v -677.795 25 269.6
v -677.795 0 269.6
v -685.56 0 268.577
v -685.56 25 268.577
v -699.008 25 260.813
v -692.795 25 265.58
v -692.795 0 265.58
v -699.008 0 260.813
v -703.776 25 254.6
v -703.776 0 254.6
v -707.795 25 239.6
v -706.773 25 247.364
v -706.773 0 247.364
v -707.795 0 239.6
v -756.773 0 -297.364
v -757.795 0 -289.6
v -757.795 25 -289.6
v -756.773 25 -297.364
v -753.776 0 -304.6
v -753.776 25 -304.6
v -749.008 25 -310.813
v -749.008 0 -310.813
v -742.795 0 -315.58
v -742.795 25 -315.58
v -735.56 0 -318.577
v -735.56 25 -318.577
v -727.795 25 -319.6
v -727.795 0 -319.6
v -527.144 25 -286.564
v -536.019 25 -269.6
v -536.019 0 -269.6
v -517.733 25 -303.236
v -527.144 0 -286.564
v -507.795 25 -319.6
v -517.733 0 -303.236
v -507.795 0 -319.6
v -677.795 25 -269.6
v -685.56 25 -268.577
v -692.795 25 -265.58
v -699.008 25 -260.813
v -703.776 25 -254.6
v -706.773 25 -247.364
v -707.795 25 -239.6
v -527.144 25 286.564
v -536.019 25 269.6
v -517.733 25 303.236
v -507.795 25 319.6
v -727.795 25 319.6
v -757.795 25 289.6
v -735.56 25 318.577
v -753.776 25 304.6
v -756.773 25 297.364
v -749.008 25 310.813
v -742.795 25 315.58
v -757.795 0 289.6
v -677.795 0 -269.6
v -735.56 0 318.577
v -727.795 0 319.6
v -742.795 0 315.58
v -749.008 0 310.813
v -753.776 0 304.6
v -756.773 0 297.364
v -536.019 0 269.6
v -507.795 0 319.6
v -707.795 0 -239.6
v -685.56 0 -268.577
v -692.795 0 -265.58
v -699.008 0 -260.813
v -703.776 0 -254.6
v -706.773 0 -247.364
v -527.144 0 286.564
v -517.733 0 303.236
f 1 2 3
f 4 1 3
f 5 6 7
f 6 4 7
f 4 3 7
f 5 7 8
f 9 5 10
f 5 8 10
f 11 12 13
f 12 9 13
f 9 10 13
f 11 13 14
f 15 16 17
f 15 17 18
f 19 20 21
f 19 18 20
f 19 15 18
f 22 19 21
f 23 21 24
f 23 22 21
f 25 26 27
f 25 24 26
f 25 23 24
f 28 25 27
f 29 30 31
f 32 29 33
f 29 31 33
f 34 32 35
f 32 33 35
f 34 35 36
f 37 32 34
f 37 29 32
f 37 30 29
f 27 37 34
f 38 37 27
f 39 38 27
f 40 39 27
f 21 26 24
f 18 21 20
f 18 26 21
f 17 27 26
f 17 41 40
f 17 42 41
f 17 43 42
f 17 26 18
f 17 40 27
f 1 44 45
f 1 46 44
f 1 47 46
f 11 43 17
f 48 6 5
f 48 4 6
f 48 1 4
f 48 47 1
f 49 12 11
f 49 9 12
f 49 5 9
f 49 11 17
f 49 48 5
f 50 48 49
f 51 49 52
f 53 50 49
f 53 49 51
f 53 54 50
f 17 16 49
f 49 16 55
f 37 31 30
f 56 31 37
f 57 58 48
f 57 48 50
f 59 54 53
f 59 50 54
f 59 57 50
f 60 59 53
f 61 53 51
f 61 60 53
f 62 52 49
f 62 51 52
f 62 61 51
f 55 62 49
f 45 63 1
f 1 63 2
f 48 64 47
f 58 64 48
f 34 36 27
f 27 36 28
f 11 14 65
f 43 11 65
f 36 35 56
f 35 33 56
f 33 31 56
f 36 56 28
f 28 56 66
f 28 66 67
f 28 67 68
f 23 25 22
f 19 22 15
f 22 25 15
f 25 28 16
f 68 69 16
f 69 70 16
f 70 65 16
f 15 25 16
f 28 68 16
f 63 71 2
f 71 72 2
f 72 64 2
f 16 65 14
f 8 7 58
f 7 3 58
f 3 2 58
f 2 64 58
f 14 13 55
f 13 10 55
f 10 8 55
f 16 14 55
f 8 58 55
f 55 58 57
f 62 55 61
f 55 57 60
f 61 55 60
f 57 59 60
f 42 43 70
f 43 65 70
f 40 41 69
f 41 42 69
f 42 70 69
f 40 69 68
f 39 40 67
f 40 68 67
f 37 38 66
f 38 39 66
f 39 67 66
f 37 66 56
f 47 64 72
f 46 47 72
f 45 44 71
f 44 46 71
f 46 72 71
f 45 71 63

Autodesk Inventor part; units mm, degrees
ref_plane "YZ Plane" through (0, 0, 0) normal (1, 0, 0) x (0, 1, 0)
ref_plane "XZ Plane" through (0, 0, 0) normal (0, 1, 0) x (-1, 0, 0)
ref_plane "XY Plane" through (0, 0, 0) normal (0, 0, 1) x (1, 0, 0)
sketch "Sketch1" plane through (0, 0, 0) normal (0, 1, 0) x (-1, 0, 0)
  circle A0 centre (0, 0) radius 600
  line L0 (0, 0) -> (507.7952, 0) construction
  line L1 (507.7952, 0) -> (507.7952, -319.5997) construction
  line L2 (507.7952, 0) -> (507.7952, 319.5997) construction
  line L3 (507.7952, 319.5997) -> (507.7952, 269.5997)
  line L4 (507.7952, -319.5997) -> (507.7952, -269.5997)
  line L5 (507.7952, 319.5997) -> (727.7952, 319.5997)
  line L6 (507.7952, -319.5997) -> (727.7952, -319.5997)
  line L7 (757.7952, -289.5997) -> (757.7952, 289.5997)
  line L8 (707.7952, 239.5997) -> (707.7952, -239.5997)
  line L9 (507.7952, -269.5997) -> (677.7952, -269.5997)
  line L10 (507.7952, 269.5997) -> (677.7952, 269.5997)
  arc A1 (757.7952, 289.5997) -> (727.7952, 319.5997) centre (727.7952, 289.5997) ccw
  arc A2 (727.7952, -319.5997) -> (757.7952, -289.5997) centre (727.7952, -289.5997) ccw
  arc A3 (677.7952, -269.5997) -> (707.7952, -239.5997) centre (677.7952, -239.5997) ccw
  arc A4 (707.7952, 239.5997) -> (677.7952, 269.5997) centre (677.7952, 239.5997) ccw
  point P0 (757.7952, 319.5997)
  point P1 (707.7952, 319.5997)
  point P2 (707.7952, -319.5997)
  point P3 (536.0186, 269.5997)
  point P4 (536.0186, -269.5997)
  dimension "d0" = 1200
  dimension "d1" = 50
  dimension "d2" = 319.5997
  dimension "d3" = 50
  dimension "d4" = 250
  dimension "d7" = 50
  dimension "d8" = 30
  dimension "d9" = 30
  dimension "d10" = 30
  dimension "d11" = 30
extrude "Extrusion1" add sketch "Sketch1" along normal blind 25 contours L5 A1 L7 A2 L6 A0 L9 A3 L8 A4 L10
properties part number "handlebar"
